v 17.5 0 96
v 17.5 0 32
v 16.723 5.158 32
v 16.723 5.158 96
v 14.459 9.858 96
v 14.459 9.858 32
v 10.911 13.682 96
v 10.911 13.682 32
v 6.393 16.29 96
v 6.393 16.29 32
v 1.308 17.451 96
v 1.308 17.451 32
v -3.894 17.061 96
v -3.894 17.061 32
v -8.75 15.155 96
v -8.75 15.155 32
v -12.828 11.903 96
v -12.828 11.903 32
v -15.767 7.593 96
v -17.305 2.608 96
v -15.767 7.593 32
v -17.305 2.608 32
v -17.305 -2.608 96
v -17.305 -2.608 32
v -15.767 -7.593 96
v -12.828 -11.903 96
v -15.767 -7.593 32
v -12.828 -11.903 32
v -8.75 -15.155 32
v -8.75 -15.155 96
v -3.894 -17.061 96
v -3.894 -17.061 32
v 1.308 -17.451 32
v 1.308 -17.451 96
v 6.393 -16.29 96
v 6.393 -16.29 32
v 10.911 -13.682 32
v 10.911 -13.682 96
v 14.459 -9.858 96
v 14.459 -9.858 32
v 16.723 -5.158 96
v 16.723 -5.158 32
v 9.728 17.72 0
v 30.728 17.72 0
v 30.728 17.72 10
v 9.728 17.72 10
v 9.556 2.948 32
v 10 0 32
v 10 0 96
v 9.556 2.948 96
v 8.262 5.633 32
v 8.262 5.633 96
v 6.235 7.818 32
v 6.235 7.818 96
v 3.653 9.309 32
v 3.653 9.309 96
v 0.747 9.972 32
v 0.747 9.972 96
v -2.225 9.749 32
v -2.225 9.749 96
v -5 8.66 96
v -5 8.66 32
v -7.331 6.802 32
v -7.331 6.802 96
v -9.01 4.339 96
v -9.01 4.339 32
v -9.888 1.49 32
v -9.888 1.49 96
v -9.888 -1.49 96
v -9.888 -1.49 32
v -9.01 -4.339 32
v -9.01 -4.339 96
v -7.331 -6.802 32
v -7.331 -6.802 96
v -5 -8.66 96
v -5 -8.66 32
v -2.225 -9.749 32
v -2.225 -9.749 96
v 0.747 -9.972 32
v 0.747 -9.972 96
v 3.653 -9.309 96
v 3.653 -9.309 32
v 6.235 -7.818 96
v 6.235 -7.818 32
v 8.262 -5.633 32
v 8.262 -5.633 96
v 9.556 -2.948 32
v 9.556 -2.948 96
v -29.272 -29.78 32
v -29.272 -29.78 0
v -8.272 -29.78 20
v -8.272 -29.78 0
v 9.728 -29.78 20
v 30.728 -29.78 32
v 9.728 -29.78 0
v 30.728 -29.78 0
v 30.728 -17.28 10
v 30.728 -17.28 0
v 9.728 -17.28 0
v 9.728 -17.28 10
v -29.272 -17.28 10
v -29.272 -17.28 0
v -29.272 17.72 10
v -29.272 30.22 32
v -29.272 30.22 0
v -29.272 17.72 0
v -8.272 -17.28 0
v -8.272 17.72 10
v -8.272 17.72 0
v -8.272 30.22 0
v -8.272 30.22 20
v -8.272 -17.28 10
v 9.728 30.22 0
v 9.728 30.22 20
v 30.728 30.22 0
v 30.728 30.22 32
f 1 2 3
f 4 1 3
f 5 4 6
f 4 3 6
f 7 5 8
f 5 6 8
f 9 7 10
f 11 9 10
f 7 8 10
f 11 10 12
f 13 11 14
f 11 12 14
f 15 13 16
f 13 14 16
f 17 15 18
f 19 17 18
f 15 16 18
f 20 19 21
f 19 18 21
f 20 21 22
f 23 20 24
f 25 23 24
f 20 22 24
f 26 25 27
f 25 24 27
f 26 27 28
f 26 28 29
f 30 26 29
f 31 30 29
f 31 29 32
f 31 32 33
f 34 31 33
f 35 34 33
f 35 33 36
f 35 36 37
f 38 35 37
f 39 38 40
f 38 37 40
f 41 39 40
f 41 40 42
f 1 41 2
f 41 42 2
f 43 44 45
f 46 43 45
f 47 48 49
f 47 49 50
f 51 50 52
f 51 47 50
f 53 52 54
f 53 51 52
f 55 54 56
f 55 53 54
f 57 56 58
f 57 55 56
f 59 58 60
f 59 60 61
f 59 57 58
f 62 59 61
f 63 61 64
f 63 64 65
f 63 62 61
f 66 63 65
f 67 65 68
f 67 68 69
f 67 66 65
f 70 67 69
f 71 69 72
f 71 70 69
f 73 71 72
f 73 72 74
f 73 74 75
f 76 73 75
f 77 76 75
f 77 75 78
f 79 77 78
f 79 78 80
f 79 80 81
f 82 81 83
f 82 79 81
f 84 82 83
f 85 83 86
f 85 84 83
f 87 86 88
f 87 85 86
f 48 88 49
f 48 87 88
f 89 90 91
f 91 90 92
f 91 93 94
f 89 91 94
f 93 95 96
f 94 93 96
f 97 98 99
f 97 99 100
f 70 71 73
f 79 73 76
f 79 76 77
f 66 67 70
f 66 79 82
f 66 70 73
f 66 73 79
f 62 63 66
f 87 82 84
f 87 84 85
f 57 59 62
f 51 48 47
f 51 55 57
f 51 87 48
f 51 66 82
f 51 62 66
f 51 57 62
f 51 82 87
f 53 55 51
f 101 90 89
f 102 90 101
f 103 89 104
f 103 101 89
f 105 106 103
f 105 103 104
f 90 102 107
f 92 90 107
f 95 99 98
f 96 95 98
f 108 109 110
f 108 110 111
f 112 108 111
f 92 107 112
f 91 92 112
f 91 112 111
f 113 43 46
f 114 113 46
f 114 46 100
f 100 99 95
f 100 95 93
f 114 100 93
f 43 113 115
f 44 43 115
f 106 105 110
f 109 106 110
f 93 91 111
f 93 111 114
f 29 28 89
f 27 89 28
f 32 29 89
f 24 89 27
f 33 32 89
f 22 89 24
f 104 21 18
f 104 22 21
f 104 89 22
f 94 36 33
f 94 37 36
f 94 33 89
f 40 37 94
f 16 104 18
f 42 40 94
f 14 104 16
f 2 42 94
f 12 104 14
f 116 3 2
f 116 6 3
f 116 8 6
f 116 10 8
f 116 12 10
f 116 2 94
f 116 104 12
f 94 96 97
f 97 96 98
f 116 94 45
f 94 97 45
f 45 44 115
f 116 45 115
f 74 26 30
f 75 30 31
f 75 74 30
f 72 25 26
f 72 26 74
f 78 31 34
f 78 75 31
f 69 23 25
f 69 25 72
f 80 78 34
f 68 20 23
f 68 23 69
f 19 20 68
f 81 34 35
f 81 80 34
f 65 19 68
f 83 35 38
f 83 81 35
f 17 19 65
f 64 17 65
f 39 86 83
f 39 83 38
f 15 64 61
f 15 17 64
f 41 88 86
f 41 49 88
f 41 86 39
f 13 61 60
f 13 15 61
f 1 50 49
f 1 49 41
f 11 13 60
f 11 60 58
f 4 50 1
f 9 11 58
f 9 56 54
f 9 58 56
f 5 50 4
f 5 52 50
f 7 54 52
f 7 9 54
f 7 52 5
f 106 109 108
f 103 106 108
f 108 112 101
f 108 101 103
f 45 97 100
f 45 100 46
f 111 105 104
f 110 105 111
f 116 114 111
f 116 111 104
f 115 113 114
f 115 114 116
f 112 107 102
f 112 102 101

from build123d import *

# Parameters (mm, degrees)
F0_W     = 60
F0_H     = 60
F1_DEPTH = 32
F2_W     = 18
F2_H     = 20
F3_DEPTH = 60.001
F4_W     = 35
F4_H     = 10
F5_DEPTH = 60.001
F6_R     = 17.5
F6_R_2   = 10
F7_DEPTH = 64


with BuildPart() as f1:
    # F0 (on Top) → F1 (new body)
    with BuildSketch(Plane.XY):
        with Locations((0.728403, 0.219683)):
            Rectangle(F0_W, F0_H)
    extrude(amount=F1_DEPTH)

    # F2 (on face) → F3 (cut, through all)
    with BuildSketch(Plane.XZ.offset(29.780317)):
        with Locations((0.728403, 10)):
            Rectangle(F2_W, F2_H)
    extrude(amount=-F3_DEPTH, mode=Mode.SUBTRACT)

    # F4 (on face) → F5 (cut, through all)
    with BuildSketch(Plane.YZ.offset(30.728403)):
        with Locations((0.219683, 5)):
            Rectangle(F4_W, F4_H)
    extrude(amount=-F5_DEPTH, mode=Mode.SUBTRACT)

    # F6 (on face) → F7 (join)
    with BuildSketch(Plane.XY.offset(32)):
        Circle(F6_R)
        Circle(F6_R_2, mode=Mode.SUBTRACT)
    extrude(amount=F7_DEPTH)


solid = f1.part
